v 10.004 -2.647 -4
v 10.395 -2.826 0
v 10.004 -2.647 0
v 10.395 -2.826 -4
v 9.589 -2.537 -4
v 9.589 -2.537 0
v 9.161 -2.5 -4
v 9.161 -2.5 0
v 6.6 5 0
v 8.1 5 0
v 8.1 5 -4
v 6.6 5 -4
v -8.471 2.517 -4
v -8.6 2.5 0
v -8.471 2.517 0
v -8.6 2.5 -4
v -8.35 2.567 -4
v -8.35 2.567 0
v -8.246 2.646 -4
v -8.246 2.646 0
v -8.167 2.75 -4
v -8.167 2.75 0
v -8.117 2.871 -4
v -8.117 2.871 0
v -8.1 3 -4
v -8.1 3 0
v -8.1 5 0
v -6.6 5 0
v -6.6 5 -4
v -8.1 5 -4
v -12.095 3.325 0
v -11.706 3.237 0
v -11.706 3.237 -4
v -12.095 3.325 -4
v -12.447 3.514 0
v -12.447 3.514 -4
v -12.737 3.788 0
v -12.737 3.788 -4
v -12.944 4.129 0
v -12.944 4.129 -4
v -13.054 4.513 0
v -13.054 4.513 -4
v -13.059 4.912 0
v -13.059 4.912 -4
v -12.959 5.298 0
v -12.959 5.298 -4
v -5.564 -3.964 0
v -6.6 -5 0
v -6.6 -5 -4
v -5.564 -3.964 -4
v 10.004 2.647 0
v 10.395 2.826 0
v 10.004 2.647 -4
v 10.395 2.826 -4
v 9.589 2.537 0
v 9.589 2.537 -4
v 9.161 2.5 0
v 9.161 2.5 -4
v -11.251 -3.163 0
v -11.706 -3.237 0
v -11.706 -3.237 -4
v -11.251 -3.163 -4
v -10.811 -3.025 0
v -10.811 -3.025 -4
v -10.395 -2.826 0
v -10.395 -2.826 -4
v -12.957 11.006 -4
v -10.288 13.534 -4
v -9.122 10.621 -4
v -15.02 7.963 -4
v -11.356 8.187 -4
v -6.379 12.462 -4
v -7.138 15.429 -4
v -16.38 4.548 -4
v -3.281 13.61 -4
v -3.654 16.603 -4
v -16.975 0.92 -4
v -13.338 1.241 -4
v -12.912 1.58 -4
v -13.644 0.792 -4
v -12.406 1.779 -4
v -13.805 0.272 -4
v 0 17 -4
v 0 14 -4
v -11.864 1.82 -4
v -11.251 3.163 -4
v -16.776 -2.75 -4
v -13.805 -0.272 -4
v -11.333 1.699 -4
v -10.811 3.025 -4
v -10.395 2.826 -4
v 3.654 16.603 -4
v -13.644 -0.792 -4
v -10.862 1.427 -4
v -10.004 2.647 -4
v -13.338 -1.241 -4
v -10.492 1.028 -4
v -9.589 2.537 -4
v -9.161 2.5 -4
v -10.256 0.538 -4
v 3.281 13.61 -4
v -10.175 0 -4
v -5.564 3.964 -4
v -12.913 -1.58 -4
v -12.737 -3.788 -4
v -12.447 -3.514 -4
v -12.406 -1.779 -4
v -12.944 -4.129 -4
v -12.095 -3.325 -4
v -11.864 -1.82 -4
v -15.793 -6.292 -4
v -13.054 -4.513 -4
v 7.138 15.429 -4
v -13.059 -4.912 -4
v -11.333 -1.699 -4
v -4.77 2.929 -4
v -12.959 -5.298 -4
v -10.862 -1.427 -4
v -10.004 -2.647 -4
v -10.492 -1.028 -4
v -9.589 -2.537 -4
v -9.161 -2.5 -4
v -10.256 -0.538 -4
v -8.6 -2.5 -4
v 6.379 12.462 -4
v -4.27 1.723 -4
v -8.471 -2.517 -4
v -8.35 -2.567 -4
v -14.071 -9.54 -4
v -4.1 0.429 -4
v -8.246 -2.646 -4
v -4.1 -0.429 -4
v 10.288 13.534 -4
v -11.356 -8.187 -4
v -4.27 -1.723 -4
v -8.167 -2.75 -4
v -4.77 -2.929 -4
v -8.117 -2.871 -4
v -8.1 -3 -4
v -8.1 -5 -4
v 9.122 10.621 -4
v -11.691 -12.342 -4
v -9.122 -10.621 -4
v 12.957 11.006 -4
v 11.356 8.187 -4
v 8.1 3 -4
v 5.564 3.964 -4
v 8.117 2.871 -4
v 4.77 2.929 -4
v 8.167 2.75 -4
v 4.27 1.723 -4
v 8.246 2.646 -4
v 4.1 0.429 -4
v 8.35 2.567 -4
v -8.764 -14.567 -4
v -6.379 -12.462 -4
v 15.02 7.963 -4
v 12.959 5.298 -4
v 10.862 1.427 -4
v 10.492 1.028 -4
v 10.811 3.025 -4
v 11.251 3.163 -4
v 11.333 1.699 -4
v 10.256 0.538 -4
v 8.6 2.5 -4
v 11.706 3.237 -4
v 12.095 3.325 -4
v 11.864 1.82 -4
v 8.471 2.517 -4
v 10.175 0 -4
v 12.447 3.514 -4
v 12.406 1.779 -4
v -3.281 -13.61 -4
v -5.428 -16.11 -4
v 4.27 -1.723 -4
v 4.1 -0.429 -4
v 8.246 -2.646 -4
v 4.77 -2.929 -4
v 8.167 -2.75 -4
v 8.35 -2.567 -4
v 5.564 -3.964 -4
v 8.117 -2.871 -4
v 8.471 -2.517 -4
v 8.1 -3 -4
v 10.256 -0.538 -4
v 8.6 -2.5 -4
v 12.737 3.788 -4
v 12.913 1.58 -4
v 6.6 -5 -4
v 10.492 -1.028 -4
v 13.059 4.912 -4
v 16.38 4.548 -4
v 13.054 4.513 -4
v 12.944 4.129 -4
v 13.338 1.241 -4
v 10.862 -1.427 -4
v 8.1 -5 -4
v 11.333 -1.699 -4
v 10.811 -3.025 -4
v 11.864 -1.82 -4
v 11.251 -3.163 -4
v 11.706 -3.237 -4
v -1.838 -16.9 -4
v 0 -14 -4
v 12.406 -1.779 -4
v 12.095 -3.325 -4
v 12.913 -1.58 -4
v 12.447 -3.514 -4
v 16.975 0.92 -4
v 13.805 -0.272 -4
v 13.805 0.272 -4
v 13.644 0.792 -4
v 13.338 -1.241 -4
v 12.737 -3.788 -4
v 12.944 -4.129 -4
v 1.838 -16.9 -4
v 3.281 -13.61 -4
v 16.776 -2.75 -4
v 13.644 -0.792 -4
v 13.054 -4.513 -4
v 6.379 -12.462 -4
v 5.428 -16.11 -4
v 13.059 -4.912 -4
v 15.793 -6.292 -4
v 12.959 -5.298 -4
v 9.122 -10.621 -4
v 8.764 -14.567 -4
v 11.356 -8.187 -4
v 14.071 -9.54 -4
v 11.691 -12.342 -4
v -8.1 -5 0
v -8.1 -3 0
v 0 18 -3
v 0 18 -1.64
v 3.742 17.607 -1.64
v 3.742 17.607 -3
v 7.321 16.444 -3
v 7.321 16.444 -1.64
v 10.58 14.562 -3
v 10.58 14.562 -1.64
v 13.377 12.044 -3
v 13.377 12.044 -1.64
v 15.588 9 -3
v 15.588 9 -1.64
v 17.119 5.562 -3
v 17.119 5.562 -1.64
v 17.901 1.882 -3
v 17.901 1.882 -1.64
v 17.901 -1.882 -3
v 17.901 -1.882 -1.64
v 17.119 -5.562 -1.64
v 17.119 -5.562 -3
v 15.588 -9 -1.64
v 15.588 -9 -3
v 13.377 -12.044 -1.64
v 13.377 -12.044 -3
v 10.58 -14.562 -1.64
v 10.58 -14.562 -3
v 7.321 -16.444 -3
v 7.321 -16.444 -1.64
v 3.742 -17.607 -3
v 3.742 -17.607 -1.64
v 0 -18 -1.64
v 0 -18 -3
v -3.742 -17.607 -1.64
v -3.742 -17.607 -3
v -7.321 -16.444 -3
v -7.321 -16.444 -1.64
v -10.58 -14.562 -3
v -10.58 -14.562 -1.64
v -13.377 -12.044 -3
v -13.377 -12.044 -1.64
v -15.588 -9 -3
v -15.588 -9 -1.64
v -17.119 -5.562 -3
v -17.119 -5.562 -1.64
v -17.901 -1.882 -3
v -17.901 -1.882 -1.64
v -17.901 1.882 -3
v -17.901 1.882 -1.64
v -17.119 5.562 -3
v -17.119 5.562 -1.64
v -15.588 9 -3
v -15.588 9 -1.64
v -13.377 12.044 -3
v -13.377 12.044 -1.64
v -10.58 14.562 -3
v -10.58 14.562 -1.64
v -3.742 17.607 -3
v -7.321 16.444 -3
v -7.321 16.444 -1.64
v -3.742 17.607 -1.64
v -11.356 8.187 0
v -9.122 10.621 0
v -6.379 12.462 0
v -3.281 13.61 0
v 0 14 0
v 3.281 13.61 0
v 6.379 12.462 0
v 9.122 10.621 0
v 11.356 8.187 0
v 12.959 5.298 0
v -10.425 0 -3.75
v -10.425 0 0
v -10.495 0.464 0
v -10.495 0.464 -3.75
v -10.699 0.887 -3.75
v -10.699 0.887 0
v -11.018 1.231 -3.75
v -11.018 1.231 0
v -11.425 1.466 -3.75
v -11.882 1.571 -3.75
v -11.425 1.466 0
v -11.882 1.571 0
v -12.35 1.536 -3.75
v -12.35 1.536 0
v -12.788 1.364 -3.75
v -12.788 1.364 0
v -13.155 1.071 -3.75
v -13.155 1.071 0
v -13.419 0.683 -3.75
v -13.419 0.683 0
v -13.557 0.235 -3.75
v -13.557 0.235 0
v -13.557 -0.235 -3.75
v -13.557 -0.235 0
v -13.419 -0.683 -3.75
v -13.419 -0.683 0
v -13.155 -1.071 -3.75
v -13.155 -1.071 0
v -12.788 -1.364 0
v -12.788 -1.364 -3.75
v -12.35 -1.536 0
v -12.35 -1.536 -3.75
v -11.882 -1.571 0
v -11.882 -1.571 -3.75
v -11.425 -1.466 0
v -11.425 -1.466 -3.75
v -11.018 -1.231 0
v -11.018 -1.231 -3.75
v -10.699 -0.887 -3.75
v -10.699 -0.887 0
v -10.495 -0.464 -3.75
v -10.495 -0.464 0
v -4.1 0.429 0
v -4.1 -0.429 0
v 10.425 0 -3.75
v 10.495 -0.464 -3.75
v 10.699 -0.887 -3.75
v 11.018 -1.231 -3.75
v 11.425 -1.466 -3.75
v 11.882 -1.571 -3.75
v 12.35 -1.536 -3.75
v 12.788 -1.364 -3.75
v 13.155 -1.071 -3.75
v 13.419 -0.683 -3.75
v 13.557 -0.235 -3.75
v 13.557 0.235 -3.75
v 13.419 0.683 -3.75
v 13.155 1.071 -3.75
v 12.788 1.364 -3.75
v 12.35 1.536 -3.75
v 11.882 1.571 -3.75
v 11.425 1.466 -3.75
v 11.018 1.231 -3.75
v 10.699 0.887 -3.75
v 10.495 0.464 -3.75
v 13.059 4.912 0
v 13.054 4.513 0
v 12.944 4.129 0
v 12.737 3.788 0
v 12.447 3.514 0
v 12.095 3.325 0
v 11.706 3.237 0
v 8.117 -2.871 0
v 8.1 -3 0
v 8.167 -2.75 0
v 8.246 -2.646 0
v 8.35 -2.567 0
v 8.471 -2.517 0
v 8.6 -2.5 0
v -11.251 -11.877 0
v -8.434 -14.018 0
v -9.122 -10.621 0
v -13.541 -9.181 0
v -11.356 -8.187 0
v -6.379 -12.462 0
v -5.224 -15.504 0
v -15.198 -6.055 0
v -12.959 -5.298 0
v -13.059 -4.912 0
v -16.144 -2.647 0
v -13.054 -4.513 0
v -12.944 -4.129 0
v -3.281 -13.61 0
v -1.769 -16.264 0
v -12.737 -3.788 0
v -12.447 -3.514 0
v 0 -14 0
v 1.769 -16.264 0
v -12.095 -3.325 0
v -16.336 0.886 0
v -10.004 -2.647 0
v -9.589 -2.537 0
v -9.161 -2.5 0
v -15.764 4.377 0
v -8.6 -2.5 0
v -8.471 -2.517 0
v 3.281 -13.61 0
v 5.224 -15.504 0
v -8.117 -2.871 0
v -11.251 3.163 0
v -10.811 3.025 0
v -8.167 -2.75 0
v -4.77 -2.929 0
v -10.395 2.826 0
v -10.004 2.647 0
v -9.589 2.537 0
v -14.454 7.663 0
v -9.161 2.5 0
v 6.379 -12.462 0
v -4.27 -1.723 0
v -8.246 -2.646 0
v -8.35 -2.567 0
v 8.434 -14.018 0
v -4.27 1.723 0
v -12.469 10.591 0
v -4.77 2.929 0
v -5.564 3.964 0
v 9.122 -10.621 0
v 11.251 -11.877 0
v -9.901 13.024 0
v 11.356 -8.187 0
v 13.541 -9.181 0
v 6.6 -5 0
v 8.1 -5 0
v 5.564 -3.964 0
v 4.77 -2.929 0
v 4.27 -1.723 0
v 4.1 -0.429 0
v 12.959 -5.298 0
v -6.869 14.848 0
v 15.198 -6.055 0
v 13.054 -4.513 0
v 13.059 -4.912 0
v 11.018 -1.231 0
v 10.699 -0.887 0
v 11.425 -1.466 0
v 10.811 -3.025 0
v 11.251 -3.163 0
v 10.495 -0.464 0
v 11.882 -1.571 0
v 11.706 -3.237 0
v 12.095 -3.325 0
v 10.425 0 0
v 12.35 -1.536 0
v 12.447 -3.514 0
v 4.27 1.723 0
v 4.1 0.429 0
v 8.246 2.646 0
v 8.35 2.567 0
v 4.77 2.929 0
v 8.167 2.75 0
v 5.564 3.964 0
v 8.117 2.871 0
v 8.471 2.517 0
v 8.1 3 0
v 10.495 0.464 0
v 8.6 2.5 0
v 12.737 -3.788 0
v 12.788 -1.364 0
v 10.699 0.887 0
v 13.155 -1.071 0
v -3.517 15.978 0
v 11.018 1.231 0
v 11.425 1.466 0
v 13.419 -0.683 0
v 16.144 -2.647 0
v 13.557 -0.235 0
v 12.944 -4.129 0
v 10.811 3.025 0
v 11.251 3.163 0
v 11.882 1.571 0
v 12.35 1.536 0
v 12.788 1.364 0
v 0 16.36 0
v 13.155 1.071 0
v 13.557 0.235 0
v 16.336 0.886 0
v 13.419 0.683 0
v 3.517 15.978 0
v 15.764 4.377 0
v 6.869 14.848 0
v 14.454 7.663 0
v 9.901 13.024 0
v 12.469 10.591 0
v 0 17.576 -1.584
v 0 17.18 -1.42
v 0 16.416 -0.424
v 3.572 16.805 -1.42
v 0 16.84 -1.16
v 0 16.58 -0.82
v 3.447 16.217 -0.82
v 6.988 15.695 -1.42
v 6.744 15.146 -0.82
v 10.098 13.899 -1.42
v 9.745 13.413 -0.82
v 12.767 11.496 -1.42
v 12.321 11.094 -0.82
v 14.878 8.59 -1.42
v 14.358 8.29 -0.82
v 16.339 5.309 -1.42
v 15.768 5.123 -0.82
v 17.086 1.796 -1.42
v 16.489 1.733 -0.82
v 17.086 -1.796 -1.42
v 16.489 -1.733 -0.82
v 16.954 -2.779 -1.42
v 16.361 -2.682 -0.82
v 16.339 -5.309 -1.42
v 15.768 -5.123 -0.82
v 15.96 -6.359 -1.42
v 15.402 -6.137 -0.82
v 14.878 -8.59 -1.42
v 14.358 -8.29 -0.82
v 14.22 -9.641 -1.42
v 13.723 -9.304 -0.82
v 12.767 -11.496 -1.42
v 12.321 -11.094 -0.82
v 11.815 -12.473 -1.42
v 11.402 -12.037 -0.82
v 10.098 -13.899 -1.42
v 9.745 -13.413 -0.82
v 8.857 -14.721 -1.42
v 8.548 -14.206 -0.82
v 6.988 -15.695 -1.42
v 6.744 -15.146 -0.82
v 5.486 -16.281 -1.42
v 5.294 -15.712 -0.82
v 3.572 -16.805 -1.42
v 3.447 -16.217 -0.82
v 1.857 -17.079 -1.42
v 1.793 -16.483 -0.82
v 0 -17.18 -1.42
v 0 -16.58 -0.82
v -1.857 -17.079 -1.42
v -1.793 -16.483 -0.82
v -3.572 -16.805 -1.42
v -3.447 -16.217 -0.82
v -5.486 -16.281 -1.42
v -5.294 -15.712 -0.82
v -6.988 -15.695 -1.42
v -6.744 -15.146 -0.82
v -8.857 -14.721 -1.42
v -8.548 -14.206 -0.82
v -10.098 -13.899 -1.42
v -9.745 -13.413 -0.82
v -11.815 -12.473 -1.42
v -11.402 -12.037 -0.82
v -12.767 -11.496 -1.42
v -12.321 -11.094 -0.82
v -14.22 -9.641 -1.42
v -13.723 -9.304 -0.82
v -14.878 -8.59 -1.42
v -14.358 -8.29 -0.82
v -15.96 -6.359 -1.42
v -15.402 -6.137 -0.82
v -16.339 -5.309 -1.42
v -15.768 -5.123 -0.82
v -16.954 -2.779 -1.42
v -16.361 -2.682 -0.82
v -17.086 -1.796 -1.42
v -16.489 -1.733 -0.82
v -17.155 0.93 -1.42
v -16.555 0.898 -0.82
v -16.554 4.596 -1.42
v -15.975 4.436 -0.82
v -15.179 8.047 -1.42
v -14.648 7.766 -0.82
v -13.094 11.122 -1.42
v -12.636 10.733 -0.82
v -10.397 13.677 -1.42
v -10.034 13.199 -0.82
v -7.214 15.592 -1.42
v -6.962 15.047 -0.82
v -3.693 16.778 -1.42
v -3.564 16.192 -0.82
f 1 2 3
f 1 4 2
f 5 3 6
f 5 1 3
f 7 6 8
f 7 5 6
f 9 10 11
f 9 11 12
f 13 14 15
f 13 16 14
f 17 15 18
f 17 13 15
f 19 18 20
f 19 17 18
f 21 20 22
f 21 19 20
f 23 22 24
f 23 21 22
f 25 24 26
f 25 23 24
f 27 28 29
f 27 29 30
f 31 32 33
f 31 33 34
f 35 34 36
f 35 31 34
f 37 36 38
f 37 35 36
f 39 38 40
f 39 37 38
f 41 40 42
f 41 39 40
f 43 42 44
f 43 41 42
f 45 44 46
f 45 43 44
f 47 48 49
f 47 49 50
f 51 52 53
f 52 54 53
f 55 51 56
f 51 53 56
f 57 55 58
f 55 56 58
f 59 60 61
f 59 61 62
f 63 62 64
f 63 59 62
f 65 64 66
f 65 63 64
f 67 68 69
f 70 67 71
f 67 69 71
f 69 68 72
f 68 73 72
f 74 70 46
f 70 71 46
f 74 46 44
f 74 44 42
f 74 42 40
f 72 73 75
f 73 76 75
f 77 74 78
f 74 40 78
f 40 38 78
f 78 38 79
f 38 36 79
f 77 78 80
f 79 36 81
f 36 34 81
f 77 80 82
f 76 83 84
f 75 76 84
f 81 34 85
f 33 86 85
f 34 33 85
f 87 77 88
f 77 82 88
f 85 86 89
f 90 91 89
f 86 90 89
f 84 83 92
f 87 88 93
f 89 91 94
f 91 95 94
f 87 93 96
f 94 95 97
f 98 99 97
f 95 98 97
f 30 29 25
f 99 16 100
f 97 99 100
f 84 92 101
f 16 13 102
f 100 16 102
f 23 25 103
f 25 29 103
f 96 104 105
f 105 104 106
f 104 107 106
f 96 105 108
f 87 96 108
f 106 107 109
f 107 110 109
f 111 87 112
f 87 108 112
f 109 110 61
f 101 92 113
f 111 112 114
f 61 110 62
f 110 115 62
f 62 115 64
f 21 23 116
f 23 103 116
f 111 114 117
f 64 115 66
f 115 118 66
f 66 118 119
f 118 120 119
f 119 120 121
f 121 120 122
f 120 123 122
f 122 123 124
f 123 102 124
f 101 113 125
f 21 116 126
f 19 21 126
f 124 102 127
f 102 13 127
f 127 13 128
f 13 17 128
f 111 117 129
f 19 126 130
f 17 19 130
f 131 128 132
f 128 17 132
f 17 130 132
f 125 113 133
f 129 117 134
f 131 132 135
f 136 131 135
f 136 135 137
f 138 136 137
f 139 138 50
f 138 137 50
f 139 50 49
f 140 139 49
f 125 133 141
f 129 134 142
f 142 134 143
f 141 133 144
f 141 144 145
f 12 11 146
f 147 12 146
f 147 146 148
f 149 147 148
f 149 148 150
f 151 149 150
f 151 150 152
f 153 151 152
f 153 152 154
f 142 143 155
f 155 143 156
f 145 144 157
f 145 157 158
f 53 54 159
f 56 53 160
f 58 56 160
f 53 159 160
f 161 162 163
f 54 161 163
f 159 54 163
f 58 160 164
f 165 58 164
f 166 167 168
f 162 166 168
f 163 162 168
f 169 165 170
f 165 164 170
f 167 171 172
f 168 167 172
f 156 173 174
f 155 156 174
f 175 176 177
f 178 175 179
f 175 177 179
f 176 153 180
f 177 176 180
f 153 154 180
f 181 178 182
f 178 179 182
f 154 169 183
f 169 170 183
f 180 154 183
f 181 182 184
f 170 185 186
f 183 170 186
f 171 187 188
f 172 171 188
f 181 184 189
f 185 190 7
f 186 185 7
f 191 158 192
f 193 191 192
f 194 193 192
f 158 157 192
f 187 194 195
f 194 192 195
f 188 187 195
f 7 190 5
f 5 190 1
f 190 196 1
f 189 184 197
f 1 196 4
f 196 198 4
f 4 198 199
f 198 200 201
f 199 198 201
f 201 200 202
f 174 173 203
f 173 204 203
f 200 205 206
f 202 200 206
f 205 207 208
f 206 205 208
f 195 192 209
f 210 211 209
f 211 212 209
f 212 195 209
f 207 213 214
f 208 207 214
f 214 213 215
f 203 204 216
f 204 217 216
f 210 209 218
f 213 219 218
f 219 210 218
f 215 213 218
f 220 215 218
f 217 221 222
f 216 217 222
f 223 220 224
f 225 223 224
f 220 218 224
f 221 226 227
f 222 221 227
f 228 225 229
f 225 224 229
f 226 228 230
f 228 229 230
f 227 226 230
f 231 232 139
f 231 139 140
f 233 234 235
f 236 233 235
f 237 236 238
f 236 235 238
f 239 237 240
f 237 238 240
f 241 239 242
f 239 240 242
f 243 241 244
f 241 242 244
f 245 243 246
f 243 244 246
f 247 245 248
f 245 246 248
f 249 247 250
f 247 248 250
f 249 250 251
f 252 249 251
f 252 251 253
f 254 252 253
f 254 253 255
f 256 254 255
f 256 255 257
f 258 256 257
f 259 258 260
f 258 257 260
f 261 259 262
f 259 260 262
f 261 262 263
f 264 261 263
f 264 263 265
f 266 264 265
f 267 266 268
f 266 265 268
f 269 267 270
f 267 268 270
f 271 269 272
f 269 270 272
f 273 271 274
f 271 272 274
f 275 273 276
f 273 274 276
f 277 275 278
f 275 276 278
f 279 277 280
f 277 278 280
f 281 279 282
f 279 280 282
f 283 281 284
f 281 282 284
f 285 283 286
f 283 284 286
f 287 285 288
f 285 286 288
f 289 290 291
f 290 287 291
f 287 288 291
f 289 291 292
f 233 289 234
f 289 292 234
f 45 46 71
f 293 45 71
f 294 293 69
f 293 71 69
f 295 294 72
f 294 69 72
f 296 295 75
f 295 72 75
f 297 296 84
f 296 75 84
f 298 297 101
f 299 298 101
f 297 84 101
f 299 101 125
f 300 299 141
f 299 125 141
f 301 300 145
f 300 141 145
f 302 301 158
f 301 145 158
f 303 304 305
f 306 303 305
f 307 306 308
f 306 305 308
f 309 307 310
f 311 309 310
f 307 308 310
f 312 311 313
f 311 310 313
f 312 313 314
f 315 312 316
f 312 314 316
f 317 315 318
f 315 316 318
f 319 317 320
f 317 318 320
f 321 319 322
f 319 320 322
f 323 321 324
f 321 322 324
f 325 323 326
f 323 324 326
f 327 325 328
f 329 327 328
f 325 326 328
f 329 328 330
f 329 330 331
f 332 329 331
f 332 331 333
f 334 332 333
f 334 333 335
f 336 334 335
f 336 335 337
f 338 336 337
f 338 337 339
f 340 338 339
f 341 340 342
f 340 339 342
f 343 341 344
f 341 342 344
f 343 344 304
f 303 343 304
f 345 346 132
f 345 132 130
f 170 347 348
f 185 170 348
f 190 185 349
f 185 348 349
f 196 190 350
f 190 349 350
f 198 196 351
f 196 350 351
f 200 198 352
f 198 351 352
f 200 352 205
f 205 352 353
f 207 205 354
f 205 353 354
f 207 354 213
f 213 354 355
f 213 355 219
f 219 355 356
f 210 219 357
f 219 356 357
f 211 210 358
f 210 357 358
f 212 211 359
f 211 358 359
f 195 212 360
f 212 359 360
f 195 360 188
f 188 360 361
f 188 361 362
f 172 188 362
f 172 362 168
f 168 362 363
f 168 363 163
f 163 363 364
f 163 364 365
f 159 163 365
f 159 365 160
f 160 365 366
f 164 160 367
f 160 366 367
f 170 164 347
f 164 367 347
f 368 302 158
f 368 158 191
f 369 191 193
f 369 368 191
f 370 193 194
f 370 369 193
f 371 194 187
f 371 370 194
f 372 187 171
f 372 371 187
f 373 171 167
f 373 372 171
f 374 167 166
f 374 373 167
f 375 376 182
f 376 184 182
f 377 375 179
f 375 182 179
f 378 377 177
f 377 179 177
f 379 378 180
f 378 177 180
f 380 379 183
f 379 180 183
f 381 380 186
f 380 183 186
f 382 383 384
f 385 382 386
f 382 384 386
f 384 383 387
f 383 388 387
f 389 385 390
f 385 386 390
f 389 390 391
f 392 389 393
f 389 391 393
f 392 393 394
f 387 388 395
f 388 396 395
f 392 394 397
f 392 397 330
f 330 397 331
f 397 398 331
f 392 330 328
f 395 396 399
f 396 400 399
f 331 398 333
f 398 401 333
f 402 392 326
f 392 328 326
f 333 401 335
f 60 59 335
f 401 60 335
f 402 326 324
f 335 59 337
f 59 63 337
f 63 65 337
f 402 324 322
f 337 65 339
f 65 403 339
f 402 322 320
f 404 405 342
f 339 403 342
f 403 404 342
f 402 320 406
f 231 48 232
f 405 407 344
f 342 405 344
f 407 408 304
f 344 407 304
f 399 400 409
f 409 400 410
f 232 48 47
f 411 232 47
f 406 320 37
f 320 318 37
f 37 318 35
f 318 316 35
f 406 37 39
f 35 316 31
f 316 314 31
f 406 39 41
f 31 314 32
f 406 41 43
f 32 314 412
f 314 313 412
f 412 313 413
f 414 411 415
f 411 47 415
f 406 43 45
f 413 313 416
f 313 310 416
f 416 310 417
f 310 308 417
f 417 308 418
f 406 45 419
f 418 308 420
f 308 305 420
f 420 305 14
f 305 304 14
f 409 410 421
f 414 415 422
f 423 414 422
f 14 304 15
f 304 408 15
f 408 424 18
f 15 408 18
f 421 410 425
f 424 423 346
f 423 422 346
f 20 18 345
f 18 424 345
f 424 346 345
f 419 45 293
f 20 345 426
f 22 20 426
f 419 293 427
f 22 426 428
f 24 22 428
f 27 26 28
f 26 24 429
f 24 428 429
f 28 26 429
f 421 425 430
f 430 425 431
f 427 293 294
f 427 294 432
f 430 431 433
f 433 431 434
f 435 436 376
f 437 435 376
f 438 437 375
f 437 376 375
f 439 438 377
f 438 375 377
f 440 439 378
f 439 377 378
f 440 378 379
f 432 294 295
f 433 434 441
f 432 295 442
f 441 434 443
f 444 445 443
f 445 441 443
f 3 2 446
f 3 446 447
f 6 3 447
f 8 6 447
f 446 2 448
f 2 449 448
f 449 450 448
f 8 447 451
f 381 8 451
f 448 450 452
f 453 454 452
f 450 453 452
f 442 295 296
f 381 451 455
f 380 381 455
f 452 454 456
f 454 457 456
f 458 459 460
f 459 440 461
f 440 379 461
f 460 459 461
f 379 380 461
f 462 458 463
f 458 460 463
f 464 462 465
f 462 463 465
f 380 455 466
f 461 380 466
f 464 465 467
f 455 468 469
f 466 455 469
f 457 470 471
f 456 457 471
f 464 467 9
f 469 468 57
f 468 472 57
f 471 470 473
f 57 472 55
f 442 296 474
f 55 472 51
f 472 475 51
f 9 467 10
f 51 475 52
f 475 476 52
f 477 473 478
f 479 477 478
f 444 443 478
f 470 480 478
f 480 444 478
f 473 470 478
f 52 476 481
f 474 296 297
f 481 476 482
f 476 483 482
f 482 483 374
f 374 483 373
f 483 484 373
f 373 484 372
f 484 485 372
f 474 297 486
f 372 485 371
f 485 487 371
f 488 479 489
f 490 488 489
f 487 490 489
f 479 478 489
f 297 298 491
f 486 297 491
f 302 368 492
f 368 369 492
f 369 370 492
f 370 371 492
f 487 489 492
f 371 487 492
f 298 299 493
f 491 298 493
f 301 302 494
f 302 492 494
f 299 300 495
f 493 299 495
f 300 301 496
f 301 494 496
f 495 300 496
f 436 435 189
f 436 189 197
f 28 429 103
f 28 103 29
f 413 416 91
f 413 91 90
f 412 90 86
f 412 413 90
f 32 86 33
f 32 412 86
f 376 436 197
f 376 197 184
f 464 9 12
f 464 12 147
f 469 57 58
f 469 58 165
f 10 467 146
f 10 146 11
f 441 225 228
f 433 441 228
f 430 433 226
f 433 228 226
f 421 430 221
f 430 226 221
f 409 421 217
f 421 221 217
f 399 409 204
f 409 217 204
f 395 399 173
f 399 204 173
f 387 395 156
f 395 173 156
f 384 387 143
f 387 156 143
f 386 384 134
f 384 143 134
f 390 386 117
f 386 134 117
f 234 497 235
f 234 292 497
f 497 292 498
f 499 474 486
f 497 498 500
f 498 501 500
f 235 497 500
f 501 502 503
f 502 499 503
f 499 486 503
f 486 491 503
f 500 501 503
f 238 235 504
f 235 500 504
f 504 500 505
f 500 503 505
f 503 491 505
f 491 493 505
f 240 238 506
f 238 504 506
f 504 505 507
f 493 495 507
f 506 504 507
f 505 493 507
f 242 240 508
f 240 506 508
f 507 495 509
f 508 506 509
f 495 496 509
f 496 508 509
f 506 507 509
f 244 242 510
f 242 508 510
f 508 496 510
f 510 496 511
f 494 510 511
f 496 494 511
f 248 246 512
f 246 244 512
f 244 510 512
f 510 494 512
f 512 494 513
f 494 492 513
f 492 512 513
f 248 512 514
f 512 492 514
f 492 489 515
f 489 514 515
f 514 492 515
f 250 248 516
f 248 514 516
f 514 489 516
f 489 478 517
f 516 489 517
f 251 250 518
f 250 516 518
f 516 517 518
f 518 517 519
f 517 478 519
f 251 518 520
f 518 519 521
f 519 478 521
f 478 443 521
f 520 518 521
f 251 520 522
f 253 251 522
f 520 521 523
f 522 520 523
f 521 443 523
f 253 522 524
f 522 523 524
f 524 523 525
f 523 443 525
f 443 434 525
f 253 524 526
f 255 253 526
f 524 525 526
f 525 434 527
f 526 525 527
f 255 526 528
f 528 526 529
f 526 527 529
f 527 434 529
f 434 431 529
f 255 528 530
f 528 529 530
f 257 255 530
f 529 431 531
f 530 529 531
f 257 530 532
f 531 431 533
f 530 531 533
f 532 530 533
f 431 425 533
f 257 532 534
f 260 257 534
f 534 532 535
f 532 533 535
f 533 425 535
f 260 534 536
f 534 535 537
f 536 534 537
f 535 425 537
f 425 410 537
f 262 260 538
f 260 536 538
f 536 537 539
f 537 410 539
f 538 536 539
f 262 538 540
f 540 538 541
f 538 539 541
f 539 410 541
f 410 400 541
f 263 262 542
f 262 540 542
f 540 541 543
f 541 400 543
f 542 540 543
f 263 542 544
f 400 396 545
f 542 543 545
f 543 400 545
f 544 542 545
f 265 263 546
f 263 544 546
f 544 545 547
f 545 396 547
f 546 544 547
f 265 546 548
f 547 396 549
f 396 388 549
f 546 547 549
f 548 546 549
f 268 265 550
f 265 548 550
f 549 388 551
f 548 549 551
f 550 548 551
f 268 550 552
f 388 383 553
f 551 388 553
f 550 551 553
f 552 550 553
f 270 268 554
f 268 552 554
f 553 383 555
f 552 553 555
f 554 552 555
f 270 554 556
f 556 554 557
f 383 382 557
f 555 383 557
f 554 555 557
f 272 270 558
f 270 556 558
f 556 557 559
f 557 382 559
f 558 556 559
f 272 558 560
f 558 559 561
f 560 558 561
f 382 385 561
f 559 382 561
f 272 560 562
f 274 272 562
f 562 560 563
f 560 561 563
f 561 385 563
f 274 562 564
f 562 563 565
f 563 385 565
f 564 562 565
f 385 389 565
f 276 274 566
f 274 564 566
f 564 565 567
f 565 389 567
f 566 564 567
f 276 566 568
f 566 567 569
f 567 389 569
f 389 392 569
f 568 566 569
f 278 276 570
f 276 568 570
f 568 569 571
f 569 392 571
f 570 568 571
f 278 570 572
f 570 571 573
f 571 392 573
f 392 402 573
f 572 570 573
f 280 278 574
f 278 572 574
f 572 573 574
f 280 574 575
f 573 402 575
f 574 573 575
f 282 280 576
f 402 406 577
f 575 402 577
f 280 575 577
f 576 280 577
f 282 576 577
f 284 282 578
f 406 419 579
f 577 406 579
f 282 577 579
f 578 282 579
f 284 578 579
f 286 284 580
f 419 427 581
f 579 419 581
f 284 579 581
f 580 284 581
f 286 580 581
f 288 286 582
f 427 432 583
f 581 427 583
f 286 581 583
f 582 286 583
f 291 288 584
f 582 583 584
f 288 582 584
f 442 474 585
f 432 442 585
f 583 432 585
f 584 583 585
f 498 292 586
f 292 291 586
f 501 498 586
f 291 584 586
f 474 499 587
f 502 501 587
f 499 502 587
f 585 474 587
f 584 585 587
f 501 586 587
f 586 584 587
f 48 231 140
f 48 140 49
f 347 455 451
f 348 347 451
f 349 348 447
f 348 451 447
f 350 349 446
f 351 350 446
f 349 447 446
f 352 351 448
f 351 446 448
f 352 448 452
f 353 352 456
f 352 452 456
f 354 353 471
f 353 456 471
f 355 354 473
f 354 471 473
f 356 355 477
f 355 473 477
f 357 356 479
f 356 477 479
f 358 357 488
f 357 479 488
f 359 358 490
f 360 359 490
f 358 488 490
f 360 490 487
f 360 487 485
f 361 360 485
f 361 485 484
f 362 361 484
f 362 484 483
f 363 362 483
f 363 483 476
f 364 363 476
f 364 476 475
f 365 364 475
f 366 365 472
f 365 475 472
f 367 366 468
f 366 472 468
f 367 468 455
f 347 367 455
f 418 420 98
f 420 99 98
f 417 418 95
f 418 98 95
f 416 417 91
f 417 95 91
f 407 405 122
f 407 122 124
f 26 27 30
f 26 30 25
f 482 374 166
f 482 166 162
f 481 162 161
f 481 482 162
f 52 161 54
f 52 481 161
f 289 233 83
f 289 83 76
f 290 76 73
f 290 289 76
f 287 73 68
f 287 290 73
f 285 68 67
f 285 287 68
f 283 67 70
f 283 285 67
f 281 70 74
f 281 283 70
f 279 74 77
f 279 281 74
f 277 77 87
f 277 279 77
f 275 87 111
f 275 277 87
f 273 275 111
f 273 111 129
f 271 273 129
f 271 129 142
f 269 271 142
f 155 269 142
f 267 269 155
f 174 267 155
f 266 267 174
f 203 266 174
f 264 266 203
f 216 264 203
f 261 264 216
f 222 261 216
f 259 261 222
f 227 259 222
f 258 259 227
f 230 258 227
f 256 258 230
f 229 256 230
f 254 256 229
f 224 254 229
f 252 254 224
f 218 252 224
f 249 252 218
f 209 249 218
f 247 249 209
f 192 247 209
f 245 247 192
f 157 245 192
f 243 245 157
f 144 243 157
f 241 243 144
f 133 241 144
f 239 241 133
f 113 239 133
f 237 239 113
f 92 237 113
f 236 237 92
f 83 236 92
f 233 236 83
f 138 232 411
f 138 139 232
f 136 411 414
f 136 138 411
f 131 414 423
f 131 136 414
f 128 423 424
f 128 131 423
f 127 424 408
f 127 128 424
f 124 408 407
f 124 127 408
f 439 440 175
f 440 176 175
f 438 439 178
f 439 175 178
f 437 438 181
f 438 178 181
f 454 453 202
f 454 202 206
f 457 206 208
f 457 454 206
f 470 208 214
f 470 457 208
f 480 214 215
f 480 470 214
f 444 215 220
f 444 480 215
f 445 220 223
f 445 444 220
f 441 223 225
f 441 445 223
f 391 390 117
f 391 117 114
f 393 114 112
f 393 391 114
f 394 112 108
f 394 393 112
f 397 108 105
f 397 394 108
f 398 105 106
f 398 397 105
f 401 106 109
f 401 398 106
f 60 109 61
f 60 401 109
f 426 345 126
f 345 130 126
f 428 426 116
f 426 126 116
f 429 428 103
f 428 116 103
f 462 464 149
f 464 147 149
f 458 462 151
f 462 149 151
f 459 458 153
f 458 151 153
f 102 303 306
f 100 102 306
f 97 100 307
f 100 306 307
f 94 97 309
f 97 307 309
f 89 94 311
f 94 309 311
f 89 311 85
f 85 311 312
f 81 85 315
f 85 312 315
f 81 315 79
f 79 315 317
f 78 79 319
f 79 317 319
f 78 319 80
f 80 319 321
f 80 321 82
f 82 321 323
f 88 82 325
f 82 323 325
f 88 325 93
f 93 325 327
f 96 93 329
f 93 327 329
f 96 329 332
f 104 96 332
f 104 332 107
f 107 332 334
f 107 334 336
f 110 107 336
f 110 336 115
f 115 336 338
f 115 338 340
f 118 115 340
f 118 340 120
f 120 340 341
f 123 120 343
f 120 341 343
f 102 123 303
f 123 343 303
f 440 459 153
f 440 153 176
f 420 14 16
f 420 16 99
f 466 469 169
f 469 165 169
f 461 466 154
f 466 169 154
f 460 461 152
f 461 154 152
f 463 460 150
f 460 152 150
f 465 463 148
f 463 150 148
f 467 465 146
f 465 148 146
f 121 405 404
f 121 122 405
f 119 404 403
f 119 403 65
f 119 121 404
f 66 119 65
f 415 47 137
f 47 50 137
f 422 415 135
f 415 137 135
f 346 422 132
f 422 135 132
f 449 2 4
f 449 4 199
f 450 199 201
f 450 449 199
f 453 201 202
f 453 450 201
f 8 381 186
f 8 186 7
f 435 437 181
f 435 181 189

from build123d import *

# Parameters (mm, degrees)
F2_R     = 1.575
F3_DEPTH = 4
F4_COUNT = 2
F5_R     = 5
F6_R     = 2.5
F7_R     = 0.5
F8_SIZE  = 1
F9_SIZE  = 0.25


with BuildPart() as f1:
    # F0 (on Right) → F1 (revolve)
    with BuildSketch(Plane.YZ):
        with BuildLine():
            Line((16.36, 0), (14, 0))
            Line((14, 0), (14, -4))
            Line((14, -4), (18, -4))
            Line((18, -4), (18, -1.64))
            ThreePointArc((18, -1.64), (16.8403448789, -1.1596551211), (16.36, 0))
        make_face()
    revolve(axis=Axis((0, 0, -0.7442336064), (0, 0, -1)))

    # F2 (on face) → F3 (join, through all)
    with BuildSketch(Plane.XY):
        with BuildLine():
            Line((-8.1, 2.5), (-9.9233440343, 2.5))
            ThreePointArc((-9.9233440343, 2.5), (-10.7587622743, 3.003635948), (-11.7060032895, 3.2366751357))
            ThreePointArc((-11.7060032895, 3.2366751357), (-12.8521864455, 3.9515520359), (-12.95875, 5.2981882222))
            ThreePointArc((-12.95875, 5.2981882222), (-14, 0), (-12.95875, -5.2981882222))
            ThreePointArc((-12.95875, -5.2981882222), (-12.8521864455, -3.9515520359), (-11.7060032895, -3.2366751357))
            ThreePointArc((-11.7060032895, -3.2366751357), (-10.7587622743, -3.003635948), (-9.9233440343, -2.5))
            Line((-9.9233440343, -2.5), (-8.1, -2.5))
            Line((-8.1, -2.5), (-8.1, -5))
            Line((-8.1, -5), (-6.6, -5))
            Line((-6.6, -5), (-4.1, -2.5))
            Line((-4.1, -2.5), (-4.1, 2.5))
            Line((-4.1, 2.5), (-6.6, 5))
            Line((-6.6, 5), (-8.1, 5))
            Line((-8.1, 5), (-8.1, 2.5))
        make_face()
        with Locations((-12, 0)):
            Circle(F2_R, mode=Mode.SUBTRACT)
    extrude(amount=-F3_DEPTH)

    # F4: F1 ×2 about axis
    f4_axis = Axis((0, 0, 0), (0, 0, -1))


with BuildPart() as f1_1:
    add(f1.part)
    for i in range(1, F4_COUNT):
        add(f1.part.rotate(f4_axis, i * 360 / F4_COUNT))

    # F5
    f5_edges = [f1_1.edges().sort_by_distance(p)[0] for p in [
        (-4.1, -2.5, -2),
        (-4.1, 2.5, -2),
        (4.1, 2.5, -2),
        (4.1, -2.5, -2),
    ]]
    fillet(f5_edges, radius=F5_R)

    # F6
    f6_edges = [f1_1.edges().sort_by_distance(p)[0] for p in [
        (-9.923344, 2.5, -2),
        (-9.923344, -2.5, -2),
        (9.923344, 2.5, -2),
        (9.923344, -2.5, -2),
    ]]
    fillet(f6_edges, radius=F6_R)

    # F7
    f7_edges = [f1_1.edges().sort_by_distance(p)[0] for p in [
        (-8.1, 2.5, -2),
        (-8.1, -2.5, -2),
        (8.1, -2.5, -2),
        (8.1, 2.5, -2),
    ]]
    fillet(f7_edges, radius=F7_R)

    # F8
    f8_edges = [f1_1.edges().sort_by_distance(p)[0] for p in [
        (0, -18, -4),
    ]]
    chamfer(f8_edges, length=F8_SIZE)

    # F9
    f9_edges = [f1_1.edges().sort_by_distance(p)[0] for p in [
        (13.575, 0, -4),
        (-13.575, 0, -4),
    ]]
    chamfer(f9_edges, length=F9_SIZE)


solid = f1_1.part
